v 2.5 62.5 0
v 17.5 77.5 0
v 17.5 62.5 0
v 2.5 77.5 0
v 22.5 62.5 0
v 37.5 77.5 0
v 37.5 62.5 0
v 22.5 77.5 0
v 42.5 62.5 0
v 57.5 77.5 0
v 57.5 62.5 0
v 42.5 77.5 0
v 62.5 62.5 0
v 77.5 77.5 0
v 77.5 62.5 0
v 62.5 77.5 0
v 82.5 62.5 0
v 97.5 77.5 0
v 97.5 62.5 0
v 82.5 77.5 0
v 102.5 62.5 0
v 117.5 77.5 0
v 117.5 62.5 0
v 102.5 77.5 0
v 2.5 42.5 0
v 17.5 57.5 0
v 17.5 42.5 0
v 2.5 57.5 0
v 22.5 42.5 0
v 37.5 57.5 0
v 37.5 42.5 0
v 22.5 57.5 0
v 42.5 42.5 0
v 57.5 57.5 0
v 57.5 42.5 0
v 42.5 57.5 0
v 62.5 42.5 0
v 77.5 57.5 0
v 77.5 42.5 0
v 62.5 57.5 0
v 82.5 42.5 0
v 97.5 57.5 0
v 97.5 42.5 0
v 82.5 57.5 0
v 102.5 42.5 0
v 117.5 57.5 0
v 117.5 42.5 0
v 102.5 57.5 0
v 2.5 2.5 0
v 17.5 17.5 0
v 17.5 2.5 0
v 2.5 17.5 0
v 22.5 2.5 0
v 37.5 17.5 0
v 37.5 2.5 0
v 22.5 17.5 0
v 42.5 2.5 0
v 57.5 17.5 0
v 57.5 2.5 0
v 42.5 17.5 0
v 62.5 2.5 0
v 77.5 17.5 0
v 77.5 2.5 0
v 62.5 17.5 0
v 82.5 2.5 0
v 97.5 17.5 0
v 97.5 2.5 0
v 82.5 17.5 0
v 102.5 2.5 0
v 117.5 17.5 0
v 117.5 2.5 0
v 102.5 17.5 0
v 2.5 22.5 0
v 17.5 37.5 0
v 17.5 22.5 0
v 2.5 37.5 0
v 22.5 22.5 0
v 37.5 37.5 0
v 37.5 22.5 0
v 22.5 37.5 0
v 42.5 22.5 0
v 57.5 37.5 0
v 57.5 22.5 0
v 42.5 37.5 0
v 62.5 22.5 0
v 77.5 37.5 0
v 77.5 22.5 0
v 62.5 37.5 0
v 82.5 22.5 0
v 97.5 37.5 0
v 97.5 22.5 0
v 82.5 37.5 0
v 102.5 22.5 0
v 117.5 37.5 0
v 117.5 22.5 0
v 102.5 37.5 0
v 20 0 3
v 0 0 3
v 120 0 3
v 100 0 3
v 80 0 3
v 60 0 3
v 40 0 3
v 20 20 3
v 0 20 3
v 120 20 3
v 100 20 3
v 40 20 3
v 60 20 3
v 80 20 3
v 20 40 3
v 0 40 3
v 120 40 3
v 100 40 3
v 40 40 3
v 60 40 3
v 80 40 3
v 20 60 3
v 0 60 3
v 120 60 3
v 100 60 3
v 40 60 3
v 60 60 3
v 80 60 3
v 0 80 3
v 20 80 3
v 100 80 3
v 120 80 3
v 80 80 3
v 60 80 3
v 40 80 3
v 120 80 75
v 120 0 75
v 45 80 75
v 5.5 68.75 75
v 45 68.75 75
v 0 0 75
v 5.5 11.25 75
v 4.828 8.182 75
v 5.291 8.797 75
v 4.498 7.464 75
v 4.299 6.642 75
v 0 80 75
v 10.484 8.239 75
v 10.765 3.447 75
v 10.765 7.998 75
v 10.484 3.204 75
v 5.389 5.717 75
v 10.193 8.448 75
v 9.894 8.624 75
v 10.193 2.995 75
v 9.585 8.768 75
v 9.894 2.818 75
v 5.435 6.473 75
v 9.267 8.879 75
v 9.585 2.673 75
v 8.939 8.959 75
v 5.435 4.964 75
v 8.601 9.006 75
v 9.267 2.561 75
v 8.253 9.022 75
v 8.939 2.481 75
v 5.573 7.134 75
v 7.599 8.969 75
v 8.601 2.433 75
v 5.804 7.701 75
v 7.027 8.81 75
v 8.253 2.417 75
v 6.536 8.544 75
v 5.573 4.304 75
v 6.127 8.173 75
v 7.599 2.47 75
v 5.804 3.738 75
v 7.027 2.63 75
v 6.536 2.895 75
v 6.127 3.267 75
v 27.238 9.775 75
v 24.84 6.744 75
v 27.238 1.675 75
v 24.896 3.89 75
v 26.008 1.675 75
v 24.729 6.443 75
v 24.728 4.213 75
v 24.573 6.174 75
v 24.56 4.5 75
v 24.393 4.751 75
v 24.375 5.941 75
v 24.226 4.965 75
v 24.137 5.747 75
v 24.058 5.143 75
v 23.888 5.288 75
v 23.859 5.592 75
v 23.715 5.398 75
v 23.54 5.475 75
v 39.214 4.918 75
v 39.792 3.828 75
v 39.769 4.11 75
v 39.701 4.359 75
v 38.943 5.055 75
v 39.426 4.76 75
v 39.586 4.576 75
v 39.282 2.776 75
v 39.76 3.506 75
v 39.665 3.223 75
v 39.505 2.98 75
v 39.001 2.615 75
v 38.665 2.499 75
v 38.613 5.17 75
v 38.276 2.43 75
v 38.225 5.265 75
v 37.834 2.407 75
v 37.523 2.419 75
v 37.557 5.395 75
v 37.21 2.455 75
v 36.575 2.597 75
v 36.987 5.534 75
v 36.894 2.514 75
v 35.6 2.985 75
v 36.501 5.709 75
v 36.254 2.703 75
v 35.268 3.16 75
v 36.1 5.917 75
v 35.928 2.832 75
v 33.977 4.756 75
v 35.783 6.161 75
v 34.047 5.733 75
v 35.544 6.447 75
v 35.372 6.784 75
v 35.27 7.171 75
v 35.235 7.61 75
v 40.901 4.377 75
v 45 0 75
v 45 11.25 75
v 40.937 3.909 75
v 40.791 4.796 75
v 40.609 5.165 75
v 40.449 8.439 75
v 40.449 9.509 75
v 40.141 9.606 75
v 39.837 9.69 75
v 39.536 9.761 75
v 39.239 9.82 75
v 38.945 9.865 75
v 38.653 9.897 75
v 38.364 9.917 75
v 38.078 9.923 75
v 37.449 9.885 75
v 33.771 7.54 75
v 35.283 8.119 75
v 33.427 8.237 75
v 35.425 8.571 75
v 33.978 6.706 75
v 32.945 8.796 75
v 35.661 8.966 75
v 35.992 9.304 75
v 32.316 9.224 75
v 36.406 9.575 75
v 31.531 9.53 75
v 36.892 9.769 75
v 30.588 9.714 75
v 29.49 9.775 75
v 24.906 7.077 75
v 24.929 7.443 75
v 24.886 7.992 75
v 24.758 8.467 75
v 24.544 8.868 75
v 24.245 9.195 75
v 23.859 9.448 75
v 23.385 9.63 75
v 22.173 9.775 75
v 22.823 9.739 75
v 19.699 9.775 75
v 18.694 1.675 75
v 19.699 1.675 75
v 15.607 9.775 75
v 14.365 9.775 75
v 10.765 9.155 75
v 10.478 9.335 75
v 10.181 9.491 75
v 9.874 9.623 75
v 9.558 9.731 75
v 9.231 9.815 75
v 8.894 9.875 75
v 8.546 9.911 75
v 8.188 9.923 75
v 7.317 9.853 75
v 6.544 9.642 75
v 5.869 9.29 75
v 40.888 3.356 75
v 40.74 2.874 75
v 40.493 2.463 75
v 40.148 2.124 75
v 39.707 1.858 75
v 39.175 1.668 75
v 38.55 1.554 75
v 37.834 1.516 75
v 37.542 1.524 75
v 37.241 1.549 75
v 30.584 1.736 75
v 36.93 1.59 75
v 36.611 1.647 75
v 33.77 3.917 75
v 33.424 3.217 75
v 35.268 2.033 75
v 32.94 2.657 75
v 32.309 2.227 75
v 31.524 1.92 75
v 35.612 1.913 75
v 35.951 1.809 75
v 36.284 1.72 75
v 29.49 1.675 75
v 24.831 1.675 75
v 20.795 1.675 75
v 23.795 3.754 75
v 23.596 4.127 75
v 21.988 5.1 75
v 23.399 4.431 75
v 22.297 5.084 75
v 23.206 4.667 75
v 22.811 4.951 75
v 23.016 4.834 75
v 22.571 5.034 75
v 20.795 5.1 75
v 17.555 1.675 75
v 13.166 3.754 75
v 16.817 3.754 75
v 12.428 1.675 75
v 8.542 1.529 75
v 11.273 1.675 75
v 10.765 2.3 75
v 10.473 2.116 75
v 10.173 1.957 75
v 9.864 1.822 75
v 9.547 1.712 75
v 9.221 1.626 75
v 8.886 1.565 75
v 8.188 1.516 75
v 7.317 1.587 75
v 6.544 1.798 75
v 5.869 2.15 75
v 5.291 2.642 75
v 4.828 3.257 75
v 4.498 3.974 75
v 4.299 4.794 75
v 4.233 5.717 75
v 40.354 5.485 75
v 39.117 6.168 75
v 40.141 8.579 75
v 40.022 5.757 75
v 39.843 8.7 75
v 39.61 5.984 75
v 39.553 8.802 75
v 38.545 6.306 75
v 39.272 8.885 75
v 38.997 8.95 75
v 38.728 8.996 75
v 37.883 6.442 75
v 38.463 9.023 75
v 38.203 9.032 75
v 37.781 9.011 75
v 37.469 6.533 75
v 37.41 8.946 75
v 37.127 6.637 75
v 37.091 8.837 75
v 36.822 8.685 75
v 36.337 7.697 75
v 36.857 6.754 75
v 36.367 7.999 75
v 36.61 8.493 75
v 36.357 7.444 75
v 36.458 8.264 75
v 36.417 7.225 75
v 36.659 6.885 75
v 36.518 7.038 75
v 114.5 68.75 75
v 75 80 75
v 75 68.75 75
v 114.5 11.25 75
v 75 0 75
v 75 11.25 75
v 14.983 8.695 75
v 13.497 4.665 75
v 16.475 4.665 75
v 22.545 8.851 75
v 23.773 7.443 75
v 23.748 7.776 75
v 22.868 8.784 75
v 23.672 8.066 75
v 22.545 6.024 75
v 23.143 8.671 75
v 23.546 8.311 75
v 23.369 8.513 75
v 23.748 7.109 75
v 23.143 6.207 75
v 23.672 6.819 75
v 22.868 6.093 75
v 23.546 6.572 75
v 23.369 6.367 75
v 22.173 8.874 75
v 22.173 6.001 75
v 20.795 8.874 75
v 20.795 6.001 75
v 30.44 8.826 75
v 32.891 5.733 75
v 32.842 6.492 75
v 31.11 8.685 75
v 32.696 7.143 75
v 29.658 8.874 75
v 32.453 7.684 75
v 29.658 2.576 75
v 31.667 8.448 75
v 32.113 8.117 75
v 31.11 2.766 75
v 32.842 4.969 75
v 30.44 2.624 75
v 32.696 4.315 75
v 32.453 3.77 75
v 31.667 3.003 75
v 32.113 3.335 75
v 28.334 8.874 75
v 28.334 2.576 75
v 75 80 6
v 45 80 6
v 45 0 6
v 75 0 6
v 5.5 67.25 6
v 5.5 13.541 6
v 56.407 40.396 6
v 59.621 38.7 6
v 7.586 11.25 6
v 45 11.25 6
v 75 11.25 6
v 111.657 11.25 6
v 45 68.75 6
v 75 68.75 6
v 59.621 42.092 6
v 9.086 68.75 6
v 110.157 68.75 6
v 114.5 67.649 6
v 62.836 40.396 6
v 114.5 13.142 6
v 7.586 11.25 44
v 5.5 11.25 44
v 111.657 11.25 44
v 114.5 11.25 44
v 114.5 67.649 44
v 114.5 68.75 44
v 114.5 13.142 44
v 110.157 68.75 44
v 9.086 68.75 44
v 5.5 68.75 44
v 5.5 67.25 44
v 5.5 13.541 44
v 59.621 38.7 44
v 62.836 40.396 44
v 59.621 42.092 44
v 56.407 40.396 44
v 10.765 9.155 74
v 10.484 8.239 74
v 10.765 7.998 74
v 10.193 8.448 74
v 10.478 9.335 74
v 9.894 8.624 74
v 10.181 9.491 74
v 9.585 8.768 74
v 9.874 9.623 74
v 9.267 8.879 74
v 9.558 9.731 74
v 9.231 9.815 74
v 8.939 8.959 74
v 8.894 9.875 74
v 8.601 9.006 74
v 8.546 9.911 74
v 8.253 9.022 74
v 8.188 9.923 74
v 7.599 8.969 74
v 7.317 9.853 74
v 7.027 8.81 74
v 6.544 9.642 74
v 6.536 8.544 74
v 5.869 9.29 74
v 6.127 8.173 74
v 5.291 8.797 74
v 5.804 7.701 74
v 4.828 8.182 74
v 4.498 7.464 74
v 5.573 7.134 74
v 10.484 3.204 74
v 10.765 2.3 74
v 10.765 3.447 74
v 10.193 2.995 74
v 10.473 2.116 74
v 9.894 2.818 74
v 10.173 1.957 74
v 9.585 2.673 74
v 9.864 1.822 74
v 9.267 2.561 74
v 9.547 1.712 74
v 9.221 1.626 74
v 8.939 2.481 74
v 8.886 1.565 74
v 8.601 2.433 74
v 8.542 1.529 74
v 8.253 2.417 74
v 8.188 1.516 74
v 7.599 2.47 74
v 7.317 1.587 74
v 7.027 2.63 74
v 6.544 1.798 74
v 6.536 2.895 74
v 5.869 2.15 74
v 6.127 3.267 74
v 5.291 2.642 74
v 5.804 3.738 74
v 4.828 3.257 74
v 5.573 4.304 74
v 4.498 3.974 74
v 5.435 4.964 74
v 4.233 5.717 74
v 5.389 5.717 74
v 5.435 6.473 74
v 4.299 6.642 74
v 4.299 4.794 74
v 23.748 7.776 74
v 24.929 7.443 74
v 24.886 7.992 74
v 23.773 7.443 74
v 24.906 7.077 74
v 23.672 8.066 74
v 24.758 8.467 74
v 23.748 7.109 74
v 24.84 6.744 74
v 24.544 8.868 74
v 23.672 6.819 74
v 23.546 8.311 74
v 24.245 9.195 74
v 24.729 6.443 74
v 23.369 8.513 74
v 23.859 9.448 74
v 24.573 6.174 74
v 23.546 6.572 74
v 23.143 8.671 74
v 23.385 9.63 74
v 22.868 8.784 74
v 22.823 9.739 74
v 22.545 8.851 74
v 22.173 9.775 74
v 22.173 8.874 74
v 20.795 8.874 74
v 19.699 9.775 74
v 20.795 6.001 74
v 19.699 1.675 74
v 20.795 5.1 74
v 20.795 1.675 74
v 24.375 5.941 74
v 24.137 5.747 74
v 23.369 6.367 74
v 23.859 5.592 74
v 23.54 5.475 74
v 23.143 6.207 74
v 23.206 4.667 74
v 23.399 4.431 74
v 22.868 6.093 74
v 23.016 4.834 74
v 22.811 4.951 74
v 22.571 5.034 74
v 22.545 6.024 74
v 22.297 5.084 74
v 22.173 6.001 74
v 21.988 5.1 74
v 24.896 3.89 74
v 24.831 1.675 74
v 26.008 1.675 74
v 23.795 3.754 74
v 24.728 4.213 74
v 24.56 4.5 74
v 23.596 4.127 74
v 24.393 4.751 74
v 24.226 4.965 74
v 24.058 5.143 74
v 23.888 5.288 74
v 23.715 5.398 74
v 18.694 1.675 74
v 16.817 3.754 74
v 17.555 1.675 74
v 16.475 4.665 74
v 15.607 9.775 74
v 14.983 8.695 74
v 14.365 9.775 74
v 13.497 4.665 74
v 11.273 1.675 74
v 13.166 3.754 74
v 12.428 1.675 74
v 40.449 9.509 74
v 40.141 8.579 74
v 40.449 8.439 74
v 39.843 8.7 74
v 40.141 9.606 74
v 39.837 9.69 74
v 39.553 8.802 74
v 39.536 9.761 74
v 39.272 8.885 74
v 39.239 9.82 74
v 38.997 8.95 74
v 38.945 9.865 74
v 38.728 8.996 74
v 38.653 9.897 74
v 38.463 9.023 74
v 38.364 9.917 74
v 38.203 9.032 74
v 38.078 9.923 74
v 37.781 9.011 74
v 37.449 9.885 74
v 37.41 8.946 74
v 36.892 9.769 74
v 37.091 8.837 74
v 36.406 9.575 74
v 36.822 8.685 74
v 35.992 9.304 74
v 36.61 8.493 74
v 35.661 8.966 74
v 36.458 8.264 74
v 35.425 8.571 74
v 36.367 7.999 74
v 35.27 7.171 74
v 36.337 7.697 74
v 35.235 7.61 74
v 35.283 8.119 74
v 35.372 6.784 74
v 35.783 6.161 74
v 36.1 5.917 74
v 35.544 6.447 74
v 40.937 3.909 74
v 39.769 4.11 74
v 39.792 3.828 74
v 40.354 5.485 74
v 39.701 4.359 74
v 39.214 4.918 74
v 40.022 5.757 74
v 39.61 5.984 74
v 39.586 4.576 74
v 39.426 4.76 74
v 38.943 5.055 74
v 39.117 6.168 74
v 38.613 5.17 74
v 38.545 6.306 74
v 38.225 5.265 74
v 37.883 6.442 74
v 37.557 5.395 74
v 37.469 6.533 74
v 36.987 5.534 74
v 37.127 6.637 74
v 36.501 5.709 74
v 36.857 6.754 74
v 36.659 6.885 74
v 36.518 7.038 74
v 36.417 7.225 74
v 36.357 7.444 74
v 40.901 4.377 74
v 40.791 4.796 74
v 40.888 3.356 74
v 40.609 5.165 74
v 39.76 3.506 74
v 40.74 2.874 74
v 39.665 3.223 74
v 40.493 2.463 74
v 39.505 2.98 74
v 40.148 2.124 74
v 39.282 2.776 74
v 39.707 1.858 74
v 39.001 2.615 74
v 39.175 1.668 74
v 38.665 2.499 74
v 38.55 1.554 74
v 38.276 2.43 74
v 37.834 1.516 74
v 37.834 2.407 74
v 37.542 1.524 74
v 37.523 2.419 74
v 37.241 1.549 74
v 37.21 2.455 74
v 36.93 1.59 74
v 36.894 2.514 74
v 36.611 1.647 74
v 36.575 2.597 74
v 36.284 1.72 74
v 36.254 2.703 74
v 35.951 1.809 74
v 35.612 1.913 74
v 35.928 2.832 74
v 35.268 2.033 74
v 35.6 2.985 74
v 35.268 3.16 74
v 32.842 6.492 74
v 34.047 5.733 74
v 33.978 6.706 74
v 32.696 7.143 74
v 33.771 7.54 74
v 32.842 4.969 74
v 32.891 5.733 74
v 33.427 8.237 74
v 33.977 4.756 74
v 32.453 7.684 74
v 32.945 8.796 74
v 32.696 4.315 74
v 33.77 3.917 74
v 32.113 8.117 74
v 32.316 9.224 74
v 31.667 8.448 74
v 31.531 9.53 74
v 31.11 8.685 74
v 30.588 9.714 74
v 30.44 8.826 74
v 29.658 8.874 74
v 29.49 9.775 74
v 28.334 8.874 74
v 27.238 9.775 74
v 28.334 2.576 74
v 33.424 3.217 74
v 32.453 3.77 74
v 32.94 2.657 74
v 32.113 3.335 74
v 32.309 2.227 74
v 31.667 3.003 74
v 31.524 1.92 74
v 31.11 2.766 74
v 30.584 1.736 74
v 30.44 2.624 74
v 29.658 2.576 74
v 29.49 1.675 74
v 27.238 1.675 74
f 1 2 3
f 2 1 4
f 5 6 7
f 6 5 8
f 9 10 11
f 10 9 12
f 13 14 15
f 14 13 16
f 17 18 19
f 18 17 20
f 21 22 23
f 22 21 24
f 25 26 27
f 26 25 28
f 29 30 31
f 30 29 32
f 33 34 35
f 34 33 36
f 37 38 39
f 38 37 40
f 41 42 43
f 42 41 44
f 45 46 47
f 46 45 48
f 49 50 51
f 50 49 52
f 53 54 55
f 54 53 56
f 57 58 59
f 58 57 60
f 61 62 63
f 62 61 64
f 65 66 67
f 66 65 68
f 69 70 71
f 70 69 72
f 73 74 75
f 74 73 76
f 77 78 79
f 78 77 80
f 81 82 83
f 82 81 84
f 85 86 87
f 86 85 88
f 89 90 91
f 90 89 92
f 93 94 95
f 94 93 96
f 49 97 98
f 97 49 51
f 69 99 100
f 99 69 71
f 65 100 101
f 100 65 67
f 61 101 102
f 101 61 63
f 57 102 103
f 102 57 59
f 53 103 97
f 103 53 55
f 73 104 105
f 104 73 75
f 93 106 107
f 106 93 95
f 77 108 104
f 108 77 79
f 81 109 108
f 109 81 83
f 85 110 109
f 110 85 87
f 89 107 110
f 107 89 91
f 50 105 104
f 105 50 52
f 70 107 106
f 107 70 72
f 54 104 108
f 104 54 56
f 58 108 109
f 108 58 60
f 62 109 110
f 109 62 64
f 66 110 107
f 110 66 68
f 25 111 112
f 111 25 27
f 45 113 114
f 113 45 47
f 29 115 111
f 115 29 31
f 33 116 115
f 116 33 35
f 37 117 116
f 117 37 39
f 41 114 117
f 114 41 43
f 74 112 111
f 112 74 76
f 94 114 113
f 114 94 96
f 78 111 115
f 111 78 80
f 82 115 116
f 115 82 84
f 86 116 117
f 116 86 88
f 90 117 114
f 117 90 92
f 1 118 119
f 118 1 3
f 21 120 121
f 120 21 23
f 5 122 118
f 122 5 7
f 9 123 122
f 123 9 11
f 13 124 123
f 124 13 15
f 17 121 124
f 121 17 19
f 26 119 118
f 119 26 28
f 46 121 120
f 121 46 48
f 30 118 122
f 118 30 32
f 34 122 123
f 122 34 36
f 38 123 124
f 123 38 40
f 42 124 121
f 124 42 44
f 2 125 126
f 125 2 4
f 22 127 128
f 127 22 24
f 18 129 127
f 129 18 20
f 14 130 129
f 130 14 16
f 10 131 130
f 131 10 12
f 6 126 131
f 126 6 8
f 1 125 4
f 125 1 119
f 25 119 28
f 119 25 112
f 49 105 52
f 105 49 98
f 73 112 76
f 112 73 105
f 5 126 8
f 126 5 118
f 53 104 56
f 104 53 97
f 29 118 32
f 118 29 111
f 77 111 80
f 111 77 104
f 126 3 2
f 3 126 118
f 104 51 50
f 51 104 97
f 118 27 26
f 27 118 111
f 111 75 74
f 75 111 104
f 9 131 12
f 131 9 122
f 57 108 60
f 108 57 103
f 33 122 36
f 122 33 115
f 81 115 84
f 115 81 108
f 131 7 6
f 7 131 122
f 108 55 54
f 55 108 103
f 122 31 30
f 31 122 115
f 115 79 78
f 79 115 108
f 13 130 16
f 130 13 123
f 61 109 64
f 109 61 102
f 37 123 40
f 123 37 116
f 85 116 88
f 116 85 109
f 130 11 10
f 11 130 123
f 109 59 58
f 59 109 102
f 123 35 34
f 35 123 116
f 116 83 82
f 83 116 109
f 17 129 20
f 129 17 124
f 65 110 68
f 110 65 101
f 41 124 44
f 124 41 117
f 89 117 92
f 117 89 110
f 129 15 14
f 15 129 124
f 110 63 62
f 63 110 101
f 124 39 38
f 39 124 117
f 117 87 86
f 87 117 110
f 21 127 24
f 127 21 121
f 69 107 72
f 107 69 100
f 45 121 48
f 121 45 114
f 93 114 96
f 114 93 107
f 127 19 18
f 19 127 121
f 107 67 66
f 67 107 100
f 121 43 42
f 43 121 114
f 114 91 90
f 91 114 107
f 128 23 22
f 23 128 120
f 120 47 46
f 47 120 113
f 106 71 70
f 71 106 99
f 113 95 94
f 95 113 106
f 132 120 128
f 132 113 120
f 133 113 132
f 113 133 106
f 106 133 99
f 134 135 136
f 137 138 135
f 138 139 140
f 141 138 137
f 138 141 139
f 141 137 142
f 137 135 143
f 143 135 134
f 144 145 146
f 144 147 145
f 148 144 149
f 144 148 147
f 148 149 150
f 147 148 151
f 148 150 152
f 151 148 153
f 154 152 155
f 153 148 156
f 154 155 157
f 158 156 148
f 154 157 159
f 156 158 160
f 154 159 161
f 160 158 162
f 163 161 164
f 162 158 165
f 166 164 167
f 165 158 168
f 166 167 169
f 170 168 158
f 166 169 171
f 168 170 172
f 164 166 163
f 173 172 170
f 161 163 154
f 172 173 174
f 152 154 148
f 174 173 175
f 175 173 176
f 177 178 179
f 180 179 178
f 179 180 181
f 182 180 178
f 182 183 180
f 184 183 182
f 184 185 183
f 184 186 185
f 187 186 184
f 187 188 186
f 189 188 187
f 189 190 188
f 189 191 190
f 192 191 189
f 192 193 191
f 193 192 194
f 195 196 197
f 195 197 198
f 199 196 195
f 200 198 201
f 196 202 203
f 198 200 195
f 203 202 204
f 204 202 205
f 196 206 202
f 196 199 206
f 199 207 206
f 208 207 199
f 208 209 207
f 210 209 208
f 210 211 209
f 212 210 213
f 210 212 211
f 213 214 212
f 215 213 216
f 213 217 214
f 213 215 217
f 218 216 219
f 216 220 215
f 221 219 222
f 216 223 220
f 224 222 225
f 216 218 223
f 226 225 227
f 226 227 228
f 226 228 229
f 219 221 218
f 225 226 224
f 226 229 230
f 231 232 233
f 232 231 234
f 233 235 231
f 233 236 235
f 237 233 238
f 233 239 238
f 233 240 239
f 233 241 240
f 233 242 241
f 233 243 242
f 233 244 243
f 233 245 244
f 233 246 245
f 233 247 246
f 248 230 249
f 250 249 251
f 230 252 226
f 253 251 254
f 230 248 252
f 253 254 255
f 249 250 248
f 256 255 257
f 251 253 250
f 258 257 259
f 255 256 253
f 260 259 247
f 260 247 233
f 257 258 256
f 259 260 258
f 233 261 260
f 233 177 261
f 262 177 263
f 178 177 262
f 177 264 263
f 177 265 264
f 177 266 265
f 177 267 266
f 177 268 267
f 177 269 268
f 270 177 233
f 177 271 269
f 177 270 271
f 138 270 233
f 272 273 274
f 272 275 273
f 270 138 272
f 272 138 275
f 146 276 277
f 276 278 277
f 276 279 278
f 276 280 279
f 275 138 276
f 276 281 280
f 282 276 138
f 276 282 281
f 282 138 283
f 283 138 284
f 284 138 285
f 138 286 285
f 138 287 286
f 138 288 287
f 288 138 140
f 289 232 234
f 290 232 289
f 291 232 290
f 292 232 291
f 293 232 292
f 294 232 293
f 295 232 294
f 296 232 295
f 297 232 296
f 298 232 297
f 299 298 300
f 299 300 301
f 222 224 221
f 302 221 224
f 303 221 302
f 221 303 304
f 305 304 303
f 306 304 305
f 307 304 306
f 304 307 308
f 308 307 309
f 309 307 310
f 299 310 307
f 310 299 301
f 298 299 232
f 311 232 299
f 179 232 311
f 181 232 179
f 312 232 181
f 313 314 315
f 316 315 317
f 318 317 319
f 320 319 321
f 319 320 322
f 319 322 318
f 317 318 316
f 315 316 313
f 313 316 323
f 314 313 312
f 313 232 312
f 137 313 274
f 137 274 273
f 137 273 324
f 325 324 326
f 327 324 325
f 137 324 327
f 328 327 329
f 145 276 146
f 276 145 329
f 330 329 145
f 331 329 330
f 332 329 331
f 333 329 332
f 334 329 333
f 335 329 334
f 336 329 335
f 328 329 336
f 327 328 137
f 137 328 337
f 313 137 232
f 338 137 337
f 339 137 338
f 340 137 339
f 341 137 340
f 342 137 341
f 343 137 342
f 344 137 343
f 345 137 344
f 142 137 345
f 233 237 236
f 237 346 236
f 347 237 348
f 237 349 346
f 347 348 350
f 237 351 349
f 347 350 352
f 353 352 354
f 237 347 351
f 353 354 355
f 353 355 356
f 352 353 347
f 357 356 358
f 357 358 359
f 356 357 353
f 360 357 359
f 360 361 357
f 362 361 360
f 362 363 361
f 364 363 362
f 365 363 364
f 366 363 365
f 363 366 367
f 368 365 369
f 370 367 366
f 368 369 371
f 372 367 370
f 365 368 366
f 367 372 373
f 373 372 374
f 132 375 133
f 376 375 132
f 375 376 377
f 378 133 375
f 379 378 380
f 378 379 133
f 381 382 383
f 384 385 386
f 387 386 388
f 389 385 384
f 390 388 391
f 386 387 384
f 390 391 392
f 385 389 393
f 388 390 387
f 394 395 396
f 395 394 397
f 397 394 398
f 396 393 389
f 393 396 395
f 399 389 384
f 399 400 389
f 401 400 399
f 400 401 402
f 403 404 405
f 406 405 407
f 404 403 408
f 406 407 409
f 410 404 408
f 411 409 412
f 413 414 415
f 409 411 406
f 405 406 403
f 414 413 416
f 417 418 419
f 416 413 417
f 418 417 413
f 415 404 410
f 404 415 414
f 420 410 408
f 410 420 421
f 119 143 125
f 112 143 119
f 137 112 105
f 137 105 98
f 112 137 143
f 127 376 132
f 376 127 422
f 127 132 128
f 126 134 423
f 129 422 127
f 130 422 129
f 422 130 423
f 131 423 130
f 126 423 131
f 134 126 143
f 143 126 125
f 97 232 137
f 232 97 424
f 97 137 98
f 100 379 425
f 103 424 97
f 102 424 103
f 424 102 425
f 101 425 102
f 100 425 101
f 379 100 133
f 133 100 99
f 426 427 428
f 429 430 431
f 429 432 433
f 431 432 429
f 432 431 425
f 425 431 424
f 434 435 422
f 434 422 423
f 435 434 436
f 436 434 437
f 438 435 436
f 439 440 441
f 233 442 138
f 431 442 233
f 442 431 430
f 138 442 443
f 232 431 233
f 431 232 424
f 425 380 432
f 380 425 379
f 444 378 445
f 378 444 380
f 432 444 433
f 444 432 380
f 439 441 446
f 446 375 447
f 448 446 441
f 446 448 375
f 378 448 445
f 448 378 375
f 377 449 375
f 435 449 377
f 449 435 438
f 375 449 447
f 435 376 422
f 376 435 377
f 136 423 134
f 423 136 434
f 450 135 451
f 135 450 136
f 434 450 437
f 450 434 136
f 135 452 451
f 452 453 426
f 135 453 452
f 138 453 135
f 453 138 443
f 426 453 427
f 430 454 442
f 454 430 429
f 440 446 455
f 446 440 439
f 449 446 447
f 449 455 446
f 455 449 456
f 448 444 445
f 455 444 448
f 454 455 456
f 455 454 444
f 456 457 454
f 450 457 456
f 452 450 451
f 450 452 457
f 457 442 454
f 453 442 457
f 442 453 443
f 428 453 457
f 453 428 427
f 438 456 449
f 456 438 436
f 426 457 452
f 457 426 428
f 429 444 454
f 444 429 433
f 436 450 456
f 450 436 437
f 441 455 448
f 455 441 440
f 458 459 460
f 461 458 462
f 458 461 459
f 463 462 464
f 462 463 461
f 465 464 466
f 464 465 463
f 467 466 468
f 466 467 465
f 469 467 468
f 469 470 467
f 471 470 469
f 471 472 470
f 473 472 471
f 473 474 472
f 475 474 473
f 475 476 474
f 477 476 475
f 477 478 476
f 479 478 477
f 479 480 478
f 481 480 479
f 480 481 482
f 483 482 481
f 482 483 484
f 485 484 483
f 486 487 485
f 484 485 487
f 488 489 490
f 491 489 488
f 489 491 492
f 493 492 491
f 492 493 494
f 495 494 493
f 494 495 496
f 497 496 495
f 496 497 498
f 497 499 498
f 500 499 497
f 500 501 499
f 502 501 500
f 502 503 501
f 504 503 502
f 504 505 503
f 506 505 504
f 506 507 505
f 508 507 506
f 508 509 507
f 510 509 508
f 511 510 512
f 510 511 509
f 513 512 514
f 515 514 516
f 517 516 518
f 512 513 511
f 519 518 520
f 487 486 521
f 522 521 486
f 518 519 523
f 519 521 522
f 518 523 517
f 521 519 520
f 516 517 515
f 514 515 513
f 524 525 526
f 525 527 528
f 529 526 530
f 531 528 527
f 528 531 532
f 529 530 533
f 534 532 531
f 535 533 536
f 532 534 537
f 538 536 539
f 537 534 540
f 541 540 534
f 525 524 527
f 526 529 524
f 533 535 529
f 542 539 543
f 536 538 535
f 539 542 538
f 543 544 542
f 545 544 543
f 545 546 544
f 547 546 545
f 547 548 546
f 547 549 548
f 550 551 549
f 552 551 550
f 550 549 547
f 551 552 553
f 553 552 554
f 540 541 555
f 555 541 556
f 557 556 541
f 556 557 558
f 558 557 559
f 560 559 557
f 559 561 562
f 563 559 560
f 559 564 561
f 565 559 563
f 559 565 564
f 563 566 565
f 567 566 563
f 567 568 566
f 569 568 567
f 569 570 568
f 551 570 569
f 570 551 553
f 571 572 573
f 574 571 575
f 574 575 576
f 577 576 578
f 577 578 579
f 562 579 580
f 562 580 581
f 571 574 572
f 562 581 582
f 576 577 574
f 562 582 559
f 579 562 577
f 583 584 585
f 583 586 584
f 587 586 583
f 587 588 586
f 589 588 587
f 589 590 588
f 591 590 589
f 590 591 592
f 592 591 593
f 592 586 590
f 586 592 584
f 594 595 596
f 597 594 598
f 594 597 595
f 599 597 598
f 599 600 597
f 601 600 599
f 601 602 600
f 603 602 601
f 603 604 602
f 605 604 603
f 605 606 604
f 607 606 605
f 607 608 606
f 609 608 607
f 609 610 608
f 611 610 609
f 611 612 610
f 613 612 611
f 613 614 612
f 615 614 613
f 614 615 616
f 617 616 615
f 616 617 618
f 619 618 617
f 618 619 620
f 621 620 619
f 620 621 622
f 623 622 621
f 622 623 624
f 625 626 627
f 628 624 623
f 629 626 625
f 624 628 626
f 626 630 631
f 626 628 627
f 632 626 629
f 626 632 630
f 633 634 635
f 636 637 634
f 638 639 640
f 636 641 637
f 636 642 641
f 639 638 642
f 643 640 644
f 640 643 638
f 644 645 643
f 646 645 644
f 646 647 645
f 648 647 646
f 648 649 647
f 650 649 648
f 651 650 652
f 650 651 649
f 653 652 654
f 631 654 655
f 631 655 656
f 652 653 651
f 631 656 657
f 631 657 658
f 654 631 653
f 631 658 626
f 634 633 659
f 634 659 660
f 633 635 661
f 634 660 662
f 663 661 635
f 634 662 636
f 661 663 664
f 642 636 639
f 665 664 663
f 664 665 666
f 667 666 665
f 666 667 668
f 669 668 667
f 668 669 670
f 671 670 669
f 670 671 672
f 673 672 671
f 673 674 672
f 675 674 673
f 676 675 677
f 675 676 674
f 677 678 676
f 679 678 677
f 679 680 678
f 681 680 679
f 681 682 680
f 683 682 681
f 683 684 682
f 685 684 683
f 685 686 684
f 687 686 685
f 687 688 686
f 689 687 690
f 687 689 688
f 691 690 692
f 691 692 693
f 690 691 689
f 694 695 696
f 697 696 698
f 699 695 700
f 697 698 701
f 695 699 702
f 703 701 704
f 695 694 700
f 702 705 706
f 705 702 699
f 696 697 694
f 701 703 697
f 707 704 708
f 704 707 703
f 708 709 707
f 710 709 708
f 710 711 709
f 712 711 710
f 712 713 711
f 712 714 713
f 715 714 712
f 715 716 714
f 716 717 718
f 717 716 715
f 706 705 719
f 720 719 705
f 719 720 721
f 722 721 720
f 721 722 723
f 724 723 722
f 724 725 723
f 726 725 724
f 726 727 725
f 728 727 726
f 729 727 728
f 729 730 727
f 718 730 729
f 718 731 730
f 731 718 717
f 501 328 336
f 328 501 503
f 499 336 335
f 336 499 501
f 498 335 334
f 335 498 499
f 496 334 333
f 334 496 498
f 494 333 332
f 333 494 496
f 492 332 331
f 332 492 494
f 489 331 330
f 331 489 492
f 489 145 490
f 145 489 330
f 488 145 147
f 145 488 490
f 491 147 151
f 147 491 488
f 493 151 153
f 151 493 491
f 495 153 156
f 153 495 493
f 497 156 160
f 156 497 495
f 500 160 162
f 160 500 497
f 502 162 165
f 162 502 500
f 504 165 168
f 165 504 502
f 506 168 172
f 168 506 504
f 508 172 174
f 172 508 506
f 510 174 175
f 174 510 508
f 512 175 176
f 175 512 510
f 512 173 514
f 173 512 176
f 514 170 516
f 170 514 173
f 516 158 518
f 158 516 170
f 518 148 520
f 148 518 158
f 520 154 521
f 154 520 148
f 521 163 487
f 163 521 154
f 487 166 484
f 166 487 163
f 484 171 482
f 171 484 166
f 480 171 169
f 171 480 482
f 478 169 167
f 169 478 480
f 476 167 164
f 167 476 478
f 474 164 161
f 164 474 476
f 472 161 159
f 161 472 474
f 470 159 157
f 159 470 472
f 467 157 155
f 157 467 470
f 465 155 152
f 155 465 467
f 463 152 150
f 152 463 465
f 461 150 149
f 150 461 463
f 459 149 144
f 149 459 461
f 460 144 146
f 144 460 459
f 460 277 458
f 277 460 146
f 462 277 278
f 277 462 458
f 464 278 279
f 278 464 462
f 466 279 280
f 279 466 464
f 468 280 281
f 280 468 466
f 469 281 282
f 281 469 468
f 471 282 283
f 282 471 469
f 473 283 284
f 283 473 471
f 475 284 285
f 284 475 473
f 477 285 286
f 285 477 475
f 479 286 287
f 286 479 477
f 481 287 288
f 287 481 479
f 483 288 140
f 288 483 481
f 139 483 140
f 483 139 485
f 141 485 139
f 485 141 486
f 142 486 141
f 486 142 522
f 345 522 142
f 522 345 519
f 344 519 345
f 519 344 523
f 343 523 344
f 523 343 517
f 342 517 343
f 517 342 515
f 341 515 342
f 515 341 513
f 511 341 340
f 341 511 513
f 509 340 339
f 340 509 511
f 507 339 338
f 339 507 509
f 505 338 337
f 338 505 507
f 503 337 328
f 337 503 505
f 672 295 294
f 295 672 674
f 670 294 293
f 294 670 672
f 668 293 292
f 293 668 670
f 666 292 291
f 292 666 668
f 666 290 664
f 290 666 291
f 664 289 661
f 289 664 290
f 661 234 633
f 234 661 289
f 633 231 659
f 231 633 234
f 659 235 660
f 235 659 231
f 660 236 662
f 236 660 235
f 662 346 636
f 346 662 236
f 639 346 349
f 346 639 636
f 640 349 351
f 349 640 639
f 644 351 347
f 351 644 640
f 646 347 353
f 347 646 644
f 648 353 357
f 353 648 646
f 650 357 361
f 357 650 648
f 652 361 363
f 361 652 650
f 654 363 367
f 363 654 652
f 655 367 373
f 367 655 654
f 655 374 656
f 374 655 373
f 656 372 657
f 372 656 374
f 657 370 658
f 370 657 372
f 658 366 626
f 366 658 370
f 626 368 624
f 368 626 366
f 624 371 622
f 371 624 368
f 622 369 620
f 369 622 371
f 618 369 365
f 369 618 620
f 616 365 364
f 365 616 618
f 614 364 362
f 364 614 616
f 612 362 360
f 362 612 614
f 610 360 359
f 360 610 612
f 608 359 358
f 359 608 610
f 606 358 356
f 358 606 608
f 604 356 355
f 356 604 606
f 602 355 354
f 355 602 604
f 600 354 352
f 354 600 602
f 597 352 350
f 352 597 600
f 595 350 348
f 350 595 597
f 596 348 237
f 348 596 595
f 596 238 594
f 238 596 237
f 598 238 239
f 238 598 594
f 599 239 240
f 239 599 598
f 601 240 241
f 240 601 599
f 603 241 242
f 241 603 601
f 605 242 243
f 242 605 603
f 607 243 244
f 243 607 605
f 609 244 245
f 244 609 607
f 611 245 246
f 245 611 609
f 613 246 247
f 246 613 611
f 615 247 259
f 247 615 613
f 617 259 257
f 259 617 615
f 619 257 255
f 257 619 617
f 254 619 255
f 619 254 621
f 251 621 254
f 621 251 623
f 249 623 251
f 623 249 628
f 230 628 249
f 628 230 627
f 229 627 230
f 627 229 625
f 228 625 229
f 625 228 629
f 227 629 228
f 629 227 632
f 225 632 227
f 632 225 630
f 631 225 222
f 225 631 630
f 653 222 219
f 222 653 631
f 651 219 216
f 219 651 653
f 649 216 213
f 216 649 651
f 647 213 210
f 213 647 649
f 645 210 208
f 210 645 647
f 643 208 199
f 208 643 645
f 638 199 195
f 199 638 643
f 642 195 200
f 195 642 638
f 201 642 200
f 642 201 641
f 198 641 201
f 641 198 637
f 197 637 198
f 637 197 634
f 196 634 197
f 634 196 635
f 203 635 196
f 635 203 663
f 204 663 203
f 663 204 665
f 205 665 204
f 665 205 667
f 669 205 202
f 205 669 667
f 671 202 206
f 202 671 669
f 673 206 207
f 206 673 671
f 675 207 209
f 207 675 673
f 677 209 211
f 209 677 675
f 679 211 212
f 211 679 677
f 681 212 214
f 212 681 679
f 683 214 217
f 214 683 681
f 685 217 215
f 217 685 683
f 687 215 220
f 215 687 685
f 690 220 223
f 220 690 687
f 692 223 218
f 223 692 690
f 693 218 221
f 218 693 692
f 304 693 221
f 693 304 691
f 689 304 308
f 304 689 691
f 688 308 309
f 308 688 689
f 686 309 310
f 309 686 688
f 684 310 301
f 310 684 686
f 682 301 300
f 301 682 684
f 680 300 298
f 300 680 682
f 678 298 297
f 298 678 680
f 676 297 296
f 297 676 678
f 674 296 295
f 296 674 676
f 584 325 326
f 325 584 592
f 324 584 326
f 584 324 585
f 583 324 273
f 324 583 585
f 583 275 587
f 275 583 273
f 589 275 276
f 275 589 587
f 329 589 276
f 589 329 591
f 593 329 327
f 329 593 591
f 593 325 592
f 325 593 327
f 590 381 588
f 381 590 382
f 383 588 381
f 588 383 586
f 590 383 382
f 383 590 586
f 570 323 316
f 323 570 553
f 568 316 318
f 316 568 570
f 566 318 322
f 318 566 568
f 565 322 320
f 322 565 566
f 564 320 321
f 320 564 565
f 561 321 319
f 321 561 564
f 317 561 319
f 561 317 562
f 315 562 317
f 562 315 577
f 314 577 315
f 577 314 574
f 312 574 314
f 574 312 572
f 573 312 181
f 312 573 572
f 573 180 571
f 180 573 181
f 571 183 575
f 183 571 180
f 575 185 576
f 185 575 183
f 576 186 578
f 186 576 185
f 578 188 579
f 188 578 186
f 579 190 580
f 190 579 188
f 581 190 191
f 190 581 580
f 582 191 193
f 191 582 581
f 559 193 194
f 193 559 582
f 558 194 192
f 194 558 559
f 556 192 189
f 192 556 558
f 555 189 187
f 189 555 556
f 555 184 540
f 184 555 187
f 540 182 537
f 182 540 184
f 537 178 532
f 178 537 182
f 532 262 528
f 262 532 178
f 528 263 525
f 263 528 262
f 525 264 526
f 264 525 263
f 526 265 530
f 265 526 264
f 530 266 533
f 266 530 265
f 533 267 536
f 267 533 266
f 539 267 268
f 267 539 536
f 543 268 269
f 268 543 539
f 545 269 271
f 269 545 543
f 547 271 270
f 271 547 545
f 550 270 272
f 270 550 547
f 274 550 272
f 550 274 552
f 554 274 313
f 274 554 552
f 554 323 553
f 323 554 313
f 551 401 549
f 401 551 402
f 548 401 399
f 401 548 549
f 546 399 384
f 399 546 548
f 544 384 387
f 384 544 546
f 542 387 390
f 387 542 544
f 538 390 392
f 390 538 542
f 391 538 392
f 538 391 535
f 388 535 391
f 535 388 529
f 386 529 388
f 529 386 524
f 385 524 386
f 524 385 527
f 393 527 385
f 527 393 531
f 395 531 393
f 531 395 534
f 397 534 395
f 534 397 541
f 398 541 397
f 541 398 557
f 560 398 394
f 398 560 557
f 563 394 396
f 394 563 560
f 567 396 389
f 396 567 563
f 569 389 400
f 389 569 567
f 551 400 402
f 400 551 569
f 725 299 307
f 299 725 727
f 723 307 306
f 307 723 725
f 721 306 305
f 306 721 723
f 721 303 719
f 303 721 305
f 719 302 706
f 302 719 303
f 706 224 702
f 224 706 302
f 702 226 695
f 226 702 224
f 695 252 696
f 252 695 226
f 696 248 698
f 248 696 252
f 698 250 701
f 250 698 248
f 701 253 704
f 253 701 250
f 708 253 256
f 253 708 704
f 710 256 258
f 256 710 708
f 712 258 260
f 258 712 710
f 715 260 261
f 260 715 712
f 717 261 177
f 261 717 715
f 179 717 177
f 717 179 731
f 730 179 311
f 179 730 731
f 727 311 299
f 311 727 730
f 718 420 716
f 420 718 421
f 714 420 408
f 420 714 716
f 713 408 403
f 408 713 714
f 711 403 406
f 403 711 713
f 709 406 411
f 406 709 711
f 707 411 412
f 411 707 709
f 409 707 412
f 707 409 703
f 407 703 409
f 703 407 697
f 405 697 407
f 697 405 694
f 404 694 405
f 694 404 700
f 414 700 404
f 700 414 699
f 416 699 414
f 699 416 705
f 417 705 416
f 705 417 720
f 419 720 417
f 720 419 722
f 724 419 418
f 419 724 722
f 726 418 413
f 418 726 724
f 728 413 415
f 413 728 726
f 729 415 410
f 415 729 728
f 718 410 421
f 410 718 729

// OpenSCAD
// file: ../chip_holder.scad
use <common.scad>

MAX_THUMB_WIDTH = 30;
WAY_DEEP = 100;

render_helper = 1;

module generate_holder(
    tile_columns = 4,
    tile_rows = 2,
    tile_width = 33,
    tile_depth = 33,
    tile_count = 20,
    tile_height = 1.75,
    wall_width = 3,
    box_height = 69,
    box_clearence = 15.75,
    round_to_full_base = true,
    fit_to_box_height = true,
    hollow_bottom = false,
    include_grid = true
) {
    function getSize(count, tile_size) = count * (tile_size + wall_width) + wall_width;
    function roundFullBase(count, tile_size) = (round_to_full_base) ? ceil(getSize(count, tile_size) / base_tile_size()) * base_tile_size() : getSize(count, tile_size);
    function max_height() = box_height - box_clearence;

    slot_height = tile_count * tile_height;
    min_floor_offset = min_floor_offset(wall_width);
    min_height = slot_height + min_floor_offset;
    total_height = (fit_to_box_height) ? max(max_height(), min_height) : min_height;
    inside_height = (hollow_bottom) ? total_height - min_floor_offset : slot_height;
    floor_offset = (fit_to_box_height) ? max_height() - inside_height : min_floor_offset;

    total_width = roundFullBase(tile_columns, tile_width);
    total_depth = roundFullBase(tile_rows, tile_depth);

    row_width = tile_depth * tile_rows;
    col_width = tile_width * tile_columns;
    outside_walls = wall_width * 2;

    col_spread = (tile_columns > 1) ? (total_width - col_width - outside_walls) / (tile_columns - 1) : 0;
    row_spread = (tile_rows > 1) ? (total_depth - row_width - outside_walls) / (tile_rows - 1) : 0;
    
    thumb_width = min(tile_width - (wall_width * 2), MAX_THUMB_WIDTH);

    function colOffset(i) = (tile_columns == 1) ?
        (total_width - tile_width) / 2 :
        wall_width + ((tile_width + col_spread) * i);
    function rowOffset(i) = (tile_rows == 1) ?
        (total_depth - tile_depth) / 2 :
        wall_width + ((tile_depth + row_spread) * i);

    module tile_slot() {
        translate([0, 0, 0])
        square([tile_width, tile_depth]);
    }

    module thumb_slot_front() {
        width = thumb_width;
        side_offset = (tile_width - width) / 2;
        translate([side_offset, -WAY_DEEP, 0])
        square([width, WAY_DEEP]);
    }

    module thumb_slot_back() {
        width = thumb_width;
        side_offset = (tile_width - width) / 2;
        translate([side_offset, tile_depth, 0])
        square([width, WAY_DEEP]);
    }

    module tile_hole(slot_type = "none") {
        box_bottom = floor_offset;
        translate([0, 0, box_bottom])
        linear_extrude(height = inside_height + render_helper)
        union() {
            tile_slot();
            if (slot_type == "front" || slot_type == "both") {
                thumb_slot_front();
            }

            if (slot_type == "back" || slot_type == "both") {
                thumb_slot_back();
            }
        }
    }

    module tile_holes() {
        for (i = [0 : tile_rows - 1]) {
            for (j = [0 : tile_columns - 1]) {
                slot_type = (tile_rows == 1) ? "both" : (i == 0) ? "front" : (i == tile_rows - 1) ? "back" : "none";
                col_offset = colOffset(j);
                row_offset = rowOffset(i);

                translate([col_offset, row_offset, 0])
                tile_hole(slot_type = slot_type);
            }
        }
    }

    module bottom_x() {
        if (hollow_bottom) {
            for (i = [0 : tile_rows - 1]) {
                for (j = [0 : tile_columns - 1]) {
                    length = sqrt(pow(tile_width, 2) + pow(tile_depth, 2));
                    rot = acos(tile_depth / length);
                    x_height = inside_height - slot_height;
                    z_offset = min_floor_offset(wall_width);

                    col_offset = colOffset(j);
                    row_offset = rowOffset(i);

                    translate([col_offset - wall_width / 2, row_offset + wall_width / 2, z_offset])
                    rotate([0, 0, -rot])
                    cube([wall_width, length + wall_width, x_height]);

                    translate([col_offset + tile_width, row_offset - wall_width / 2, z_offset])
                    rotate([0, 0, rot])
                    cube([wall_width, length + wall_width, x_height]);
                }
            }
        }
    }

    difference() {
        union() {
            difference() {
                base_block(total_width, total_depth, total_height, include_grid = include_grid);
                tile_holes();
            }
            bottom_x();
        }

        if ($children) {
            text_offset_x = (colOffset(0) + (tile_width - thumb_width) / 2) / 2;
            text_offset_y = rowOffset(0) / 2;
            
            translate([text_offset_x, text_offset_y, total_height])
            children(0);
        }
    }
}
// file: common.scad
WALL_WIDTH = 3;
BOX_HEIGHT = 75;
BOX_CLEARENCE = 13;
TILE_HEIGHT = 1.75;

FONT_SIZE = 8;

function wall_width() = WALL_WIDTH;
function box_height() = BOX_HEIGHT;
function box_clearence() = BOX_CLEARENCE;
function tile_height() = TILE_HEIGHT;
function font_size() = FONT_SIZE;
// file: ../common.scad
BASE_TILE_SIZE=20;
BASE_WIDTH=5;
PEAK_HEIGHT=3;

DEFAULT_FONT = "Ubuntu:style=Medium";
DEFAULT_FONT_DEPTH = 1;
DEFAULT_FONT_SIZE = 10;

render_helper_h = 1;

function y_up() = [90, 0, 0];
function x_up() = [90, 0, 90];

function min_floor_offset(wall_width) = wall_width + PEAK_HEIGHT;
function tri_mid() = BASE_WIDTH / 2;
function triangle() = [[0, 0],[BASE_WIDTH, 0],[tri_mid(), PEAK_HEIGHT]];
function base_tile_size() = BASE_TILE_SIZE;
function peak_height() = PEAK_HEIGHT;
function font_depth() = DEFAULT_FONT_DEPTH;
function font_size() = DEFAULT_FONT_SIZE;

function isX(direction) = (direction == "x");

module grid(width, depth, direction) {
    length = isX(direction) ? width : depth;
    slot_length = isX(direction) ? depth : width;
    translate_z = isX(direction) ? -slot_length : 0;
    rot = isX(direction) ? y_up() : x_up();

    // This is the total additional slots past the initial one
    total_slots = floor(length / BASE_TILE_SIZE);

    for (i = [0 : total_slots]) {
        offset = -tri_mid() + BASE_TILE_SIZE * i;
        rotate(rot)
        translate([offset, 0, translate_z])
        linear_extrude(height = slot_length)
        polygon(points=triangle());
    }
}

module grid_slots(width, depth) {
    grid(width, depth, "y");
    grid(width, depth, "x");
}

module base_block(width, depth, height, include_grid = true) {
    difference() {
        cube([width, depth, height]);

        if (include_grid) {
            grid_slots(width, depth);
        }
    }
}

module prism(l, w, h) {
    polyhedron(
        points=[ [0, 0, 0], [0, w, h], [l, w, h], [l, 0, 0], [0, w, 0], [l, w, 0] ],
        faces=[ [0, 1, 2, 3],
            [2, 1, 4, 5],
            [0, 3, 5, 4],
            [0, 4, 1],
            [3, 2, 5]
        ]
    );
}

module pyramid(w) {
    polyhedron(
        points=[ [w,w,0],[w,-w,0],[-w,-w,0],[-w,w,0], [0,0,w]  ],
        faces=[ [0,1,4],[1,2,4],[2,3,4],[3,0,4], [1,0,3],[2,1,3] ]
    );
}

module embossed_text(
    t,
    h = DEFAULT_FONT_DEPTH,
    font = DEFAULT_FONT,
    size = DEFAULT_FONT_SIZE,
    valign = "center",
    halign = "center",
    render_helper = true
) {
    extrude_h = (render_helper) ? h + render_helper_h : h;
    
    translate([0, 0, -h])
    linear_extrude(extrude_h)
    text(
        t,
        font = font,
        size = size,
        valign = valign,
        halign = halign
    );
}
// main file
use <../common.scad>
use <common.scad>
use <../chip_holder.scad>

CARD_WIDTH = 109;
CARD_DEPTH = 57.5;
CARD_HEIGHT = 31;

HOLLOW_BOTTOM = true;

render_helper = 1;

module card_holder(hollow_bottom = true) {
    generate_holder(
        tile_columns = 1,
        tile_rows = 1,
        tile_width = CARD_WIDTH,
        tile_depth = CARD_DEPTH,
        tile_count = 1,
        tile_height = CARD_HEIGHT,
        wall_width = wall_width(),
        box_height = box_height(),
        box_clearence = 0,
        round_to_full_base = true,
        fit_to_box_height = true,
        hollow_bottom = hollow_bottom
    ) {
        embossed_text(
            "CARDS",
            h = font_depth(),
            size = font_size()
        );
    }
}

card_holder(HOLLOW_BOTTOM);
